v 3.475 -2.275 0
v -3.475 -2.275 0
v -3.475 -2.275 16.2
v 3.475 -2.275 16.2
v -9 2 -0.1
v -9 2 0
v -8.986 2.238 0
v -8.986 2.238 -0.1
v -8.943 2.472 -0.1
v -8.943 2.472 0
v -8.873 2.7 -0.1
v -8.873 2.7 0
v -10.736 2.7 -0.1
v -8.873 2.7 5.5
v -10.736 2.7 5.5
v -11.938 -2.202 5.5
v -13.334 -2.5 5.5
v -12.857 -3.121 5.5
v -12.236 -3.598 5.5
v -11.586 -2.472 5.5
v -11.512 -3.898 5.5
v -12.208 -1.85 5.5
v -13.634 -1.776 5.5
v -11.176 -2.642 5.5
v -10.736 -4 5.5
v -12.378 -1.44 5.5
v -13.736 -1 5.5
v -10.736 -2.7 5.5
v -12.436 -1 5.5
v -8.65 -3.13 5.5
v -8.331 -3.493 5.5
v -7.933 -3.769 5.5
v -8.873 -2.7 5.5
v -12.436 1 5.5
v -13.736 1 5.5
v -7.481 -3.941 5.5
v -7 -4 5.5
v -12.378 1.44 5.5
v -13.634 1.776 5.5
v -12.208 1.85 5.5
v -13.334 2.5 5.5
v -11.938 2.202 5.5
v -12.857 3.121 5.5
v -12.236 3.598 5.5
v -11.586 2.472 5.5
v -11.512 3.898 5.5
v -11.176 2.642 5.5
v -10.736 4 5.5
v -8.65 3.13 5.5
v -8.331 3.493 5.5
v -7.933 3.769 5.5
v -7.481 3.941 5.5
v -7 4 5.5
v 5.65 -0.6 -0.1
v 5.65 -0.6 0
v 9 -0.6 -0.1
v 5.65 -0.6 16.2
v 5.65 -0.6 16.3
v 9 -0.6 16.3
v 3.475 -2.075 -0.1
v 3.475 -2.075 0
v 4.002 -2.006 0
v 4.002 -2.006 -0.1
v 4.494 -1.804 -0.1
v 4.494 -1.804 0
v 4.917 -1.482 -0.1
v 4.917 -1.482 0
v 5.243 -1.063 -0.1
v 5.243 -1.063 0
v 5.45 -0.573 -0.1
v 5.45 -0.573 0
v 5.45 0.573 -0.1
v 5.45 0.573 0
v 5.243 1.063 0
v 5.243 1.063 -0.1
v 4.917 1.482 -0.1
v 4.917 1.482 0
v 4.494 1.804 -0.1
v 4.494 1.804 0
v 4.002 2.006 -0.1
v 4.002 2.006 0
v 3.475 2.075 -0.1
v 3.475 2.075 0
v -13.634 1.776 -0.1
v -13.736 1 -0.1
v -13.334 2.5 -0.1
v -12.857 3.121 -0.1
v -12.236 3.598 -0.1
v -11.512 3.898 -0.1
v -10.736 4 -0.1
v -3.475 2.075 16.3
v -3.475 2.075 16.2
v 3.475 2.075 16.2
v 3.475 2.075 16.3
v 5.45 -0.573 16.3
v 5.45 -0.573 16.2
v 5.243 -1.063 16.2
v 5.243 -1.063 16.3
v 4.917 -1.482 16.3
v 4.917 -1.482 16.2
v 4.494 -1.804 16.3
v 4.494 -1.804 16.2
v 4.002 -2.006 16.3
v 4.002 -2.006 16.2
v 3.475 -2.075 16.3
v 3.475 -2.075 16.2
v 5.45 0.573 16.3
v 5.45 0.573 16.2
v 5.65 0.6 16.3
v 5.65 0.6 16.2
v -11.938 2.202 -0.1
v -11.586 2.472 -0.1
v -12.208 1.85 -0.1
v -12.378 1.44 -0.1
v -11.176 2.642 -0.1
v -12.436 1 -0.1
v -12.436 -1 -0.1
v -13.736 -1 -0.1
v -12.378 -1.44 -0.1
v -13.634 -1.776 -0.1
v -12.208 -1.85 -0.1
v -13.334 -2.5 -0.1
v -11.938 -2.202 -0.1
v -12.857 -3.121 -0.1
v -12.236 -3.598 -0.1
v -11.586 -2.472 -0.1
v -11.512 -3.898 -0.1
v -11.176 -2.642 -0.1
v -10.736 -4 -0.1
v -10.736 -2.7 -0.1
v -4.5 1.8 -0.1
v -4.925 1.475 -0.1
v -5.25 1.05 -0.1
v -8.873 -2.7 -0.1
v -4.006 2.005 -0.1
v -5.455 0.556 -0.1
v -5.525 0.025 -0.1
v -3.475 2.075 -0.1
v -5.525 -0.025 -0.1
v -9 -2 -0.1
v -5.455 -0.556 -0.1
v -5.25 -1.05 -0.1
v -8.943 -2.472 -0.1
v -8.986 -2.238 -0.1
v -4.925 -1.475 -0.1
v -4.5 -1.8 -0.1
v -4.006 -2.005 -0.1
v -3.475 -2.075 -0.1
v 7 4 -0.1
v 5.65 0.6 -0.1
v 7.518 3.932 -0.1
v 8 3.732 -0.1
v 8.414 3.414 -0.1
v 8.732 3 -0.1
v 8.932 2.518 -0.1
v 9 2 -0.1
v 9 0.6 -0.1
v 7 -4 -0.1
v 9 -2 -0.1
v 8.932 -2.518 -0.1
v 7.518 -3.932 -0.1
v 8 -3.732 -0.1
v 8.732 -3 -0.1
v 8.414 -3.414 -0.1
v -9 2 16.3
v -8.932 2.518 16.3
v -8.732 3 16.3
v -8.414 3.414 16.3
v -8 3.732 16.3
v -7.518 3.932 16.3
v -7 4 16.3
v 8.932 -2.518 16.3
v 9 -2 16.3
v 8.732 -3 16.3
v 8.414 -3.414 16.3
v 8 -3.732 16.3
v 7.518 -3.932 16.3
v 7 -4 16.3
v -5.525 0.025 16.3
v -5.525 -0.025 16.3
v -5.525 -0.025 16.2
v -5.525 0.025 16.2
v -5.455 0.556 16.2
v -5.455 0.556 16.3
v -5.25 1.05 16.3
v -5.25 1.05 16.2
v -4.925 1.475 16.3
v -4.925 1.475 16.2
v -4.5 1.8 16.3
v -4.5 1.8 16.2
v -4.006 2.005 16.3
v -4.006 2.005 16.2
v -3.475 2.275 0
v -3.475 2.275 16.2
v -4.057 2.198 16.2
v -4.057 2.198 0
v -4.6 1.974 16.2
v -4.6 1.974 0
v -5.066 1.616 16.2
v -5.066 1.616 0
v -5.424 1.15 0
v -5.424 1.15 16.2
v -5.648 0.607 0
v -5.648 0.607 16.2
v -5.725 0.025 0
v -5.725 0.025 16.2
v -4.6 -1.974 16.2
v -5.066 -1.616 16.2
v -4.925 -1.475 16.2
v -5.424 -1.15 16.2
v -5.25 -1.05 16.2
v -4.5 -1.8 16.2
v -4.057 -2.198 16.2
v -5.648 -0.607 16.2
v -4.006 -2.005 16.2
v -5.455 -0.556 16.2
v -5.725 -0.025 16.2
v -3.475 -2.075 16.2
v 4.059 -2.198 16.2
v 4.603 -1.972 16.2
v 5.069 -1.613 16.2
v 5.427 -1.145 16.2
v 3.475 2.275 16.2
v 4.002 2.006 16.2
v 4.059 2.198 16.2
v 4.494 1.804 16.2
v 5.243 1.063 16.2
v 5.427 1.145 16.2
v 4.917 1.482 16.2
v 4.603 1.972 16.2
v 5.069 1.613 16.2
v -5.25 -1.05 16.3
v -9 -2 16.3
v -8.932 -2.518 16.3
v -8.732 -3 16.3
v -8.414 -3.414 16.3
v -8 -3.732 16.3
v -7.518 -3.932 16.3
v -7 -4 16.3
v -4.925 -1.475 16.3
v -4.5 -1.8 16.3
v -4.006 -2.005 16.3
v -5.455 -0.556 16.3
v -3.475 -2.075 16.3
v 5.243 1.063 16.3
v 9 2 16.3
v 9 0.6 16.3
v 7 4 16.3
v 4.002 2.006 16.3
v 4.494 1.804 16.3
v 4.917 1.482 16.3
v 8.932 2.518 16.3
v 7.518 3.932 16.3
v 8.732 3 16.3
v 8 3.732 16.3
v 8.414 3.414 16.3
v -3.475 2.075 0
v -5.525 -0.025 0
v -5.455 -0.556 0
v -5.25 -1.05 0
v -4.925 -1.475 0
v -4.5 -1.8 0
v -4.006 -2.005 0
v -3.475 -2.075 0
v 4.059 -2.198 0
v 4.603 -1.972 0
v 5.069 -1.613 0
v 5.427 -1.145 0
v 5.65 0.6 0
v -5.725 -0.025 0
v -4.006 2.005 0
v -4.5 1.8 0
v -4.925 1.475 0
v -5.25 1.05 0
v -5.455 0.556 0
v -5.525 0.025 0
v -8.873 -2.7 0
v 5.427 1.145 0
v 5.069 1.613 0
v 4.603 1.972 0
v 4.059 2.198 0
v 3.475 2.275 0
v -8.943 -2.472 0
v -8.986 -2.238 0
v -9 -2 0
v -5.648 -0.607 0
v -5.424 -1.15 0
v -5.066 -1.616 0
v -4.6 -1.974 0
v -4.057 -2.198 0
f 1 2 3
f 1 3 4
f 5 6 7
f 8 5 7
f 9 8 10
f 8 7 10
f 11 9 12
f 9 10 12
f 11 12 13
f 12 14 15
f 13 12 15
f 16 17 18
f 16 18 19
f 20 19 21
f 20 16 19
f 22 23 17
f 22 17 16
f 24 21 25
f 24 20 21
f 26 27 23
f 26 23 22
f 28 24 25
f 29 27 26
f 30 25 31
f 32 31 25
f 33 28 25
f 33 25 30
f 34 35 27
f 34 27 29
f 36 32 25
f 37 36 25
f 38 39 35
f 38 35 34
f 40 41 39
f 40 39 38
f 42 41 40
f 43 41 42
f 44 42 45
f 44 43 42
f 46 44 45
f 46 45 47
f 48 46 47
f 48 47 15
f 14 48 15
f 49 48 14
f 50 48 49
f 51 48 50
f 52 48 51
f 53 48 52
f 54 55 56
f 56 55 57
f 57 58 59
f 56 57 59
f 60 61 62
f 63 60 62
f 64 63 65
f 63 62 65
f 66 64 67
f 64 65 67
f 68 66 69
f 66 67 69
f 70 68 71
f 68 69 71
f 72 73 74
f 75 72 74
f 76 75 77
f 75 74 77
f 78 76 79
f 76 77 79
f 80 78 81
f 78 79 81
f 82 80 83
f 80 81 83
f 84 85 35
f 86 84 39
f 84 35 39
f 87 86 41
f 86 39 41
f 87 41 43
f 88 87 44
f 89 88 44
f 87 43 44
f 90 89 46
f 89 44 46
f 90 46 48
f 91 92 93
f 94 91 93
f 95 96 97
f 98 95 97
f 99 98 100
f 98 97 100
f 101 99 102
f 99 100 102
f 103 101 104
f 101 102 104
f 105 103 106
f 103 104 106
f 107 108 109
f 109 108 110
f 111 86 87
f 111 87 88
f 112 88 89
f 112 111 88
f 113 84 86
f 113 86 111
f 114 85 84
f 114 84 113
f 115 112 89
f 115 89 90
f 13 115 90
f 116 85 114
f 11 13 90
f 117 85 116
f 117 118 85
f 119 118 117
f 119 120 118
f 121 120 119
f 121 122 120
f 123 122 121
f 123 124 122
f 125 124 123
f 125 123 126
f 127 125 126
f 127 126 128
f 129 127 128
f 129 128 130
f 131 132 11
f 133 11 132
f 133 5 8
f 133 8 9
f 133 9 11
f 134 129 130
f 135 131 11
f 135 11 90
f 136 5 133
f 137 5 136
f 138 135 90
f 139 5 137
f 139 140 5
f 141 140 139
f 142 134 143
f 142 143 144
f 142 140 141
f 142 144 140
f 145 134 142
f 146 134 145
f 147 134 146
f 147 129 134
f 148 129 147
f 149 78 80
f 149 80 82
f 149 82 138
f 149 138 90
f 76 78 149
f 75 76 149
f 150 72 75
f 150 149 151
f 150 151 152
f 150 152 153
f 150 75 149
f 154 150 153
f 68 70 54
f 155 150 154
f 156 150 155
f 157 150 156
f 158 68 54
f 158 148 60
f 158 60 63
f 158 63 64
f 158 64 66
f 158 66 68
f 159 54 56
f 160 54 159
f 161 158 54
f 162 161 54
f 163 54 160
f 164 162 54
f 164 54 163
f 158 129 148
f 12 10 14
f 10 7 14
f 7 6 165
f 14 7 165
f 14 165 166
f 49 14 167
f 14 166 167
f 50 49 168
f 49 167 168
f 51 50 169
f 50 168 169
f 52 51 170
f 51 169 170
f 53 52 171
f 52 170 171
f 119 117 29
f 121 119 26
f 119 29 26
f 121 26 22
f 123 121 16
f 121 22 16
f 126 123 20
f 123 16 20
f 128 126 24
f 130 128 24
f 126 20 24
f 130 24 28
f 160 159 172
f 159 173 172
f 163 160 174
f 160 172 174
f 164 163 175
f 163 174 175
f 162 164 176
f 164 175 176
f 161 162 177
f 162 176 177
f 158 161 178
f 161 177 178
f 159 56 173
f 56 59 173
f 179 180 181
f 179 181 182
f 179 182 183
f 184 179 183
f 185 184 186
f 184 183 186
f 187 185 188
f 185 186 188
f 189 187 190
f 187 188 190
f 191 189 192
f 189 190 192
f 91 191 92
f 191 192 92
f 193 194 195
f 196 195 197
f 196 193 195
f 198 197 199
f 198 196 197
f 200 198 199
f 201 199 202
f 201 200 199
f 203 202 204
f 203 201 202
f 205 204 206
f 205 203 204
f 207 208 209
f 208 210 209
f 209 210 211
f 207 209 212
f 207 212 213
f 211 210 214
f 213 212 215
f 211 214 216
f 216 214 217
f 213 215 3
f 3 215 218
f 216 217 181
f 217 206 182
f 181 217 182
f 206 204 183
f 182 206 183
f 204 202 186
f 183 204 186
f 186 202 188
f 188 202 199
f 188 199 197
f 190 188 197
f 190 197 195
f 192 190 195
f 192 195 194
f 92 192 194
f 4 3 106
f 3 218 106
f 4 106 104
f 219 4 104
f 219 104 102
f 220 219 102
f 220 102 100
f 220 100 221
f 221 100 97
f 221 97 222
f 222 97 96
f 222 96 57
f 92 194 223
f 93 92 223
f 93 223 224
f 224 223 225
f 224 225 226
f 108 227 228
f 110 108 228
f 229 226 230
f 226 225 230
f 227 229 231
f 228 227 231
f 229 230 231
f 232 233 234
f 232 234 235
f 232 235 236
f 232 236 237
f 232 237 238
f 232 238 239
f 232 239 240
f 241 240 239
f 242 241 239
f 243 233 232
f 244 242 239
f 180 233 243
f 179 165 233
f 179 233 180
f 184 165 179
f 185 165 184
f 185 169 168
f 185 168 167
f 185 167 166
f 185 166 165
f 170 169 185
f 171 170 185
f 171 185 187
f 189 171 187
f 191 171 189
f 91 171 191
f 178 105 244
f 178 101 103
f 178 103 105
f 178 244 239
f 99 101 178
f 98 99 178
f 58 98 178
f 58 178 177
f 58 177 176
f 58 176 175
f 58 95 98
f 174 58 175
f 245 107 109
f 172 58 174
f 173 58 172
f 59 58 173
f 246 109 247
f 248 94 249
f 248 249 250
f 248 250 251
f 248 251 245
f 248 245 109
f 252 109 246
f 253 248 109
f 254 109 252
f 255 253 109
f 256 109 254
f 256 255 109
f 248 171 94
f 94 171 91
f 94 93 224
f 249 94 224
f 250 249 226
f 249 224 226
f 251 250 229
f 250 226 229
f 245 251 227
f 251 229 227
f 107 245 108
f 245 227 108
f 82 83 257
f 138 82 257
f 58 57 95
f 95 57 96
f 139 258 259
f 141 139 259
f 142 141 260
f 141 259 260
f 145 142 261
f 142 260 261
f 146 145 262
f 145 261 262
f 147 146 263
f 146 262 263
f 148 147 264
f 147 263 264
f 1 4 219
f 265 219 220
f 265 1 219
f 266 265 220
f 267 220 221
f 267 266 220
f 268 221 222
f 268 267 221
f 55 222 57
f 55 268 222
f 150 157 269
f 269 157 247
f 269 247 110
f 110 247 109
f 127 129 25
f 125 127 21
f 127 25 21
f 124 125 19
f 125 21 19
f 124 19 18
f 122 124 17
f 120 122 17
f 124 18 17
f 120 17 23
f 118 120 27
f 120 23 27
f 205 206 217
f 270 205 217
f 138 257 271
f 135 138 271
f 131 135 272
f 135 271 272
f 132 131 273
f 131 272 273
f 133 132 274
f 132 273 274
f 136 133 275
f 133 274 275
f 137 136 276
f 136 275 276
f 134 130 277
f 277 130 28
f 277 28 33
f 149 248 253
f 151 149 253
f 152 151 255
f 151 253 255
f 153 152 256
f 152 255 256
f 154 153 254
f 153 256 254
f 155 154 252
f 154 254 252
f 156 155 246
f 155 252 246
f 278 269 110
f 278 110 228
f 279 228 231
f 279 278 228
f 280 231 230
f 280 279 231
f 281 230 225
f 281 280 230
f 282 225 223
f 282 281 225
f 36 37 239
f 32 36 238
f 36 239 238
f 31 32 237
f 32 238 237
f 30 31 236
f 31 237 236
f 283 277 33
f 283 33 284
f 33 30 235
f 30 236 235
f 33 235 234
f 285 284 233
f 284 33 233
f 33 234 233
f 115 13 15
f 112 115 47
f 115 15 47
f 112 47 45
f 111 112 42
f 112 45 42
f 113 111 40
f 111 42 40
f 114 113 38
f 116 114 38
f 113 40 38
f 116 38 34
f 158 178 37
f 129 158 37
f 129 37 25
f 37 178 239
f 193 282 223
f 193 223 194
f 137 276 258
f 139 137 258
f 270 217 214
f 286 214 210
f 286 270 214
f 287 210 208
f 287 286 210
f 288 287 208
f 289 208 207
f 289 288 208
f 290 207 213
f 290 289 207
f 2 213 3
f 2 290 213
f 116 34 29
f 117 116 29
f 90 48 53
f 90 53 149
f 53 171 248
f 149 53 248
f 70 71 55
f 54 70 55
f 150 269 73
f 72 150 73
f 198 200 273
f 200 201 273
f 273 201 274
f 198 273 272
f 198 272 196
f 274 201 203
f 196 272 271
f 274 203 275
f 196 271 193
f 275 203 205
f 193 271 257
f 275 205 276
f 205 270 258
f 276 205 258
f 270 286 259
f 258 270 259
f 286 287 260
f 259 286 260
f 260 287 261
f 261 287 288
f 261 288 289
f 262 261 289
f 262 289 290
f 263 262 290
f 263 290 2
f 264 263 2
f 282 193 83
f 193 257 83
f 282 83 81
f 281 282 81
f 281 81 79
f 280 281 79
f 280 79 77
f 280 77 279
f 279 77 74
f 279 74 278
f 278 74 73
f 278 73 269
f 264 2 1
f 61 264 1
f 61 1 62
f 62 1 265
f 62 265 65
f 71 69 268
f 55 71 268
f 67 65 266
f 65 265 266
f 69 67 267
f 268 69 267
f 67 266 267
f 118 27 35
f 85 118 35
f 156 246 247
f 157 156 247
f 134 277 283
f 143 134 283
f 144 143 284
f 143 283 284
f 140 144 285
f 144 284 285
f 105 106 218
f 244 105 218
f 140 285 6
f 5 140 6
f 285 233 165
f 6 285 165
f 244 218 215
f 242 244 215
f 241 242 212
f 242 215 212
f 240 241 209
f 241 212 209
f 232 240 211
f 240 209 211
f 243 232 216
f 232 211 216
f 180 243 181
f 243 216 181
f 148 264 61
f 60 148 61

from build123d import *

# Parameters (mm, degrees)
F0_W      = 8
F0_H      = 2.5
F1_DEPTH  = 16.25
F3_DEPTH  = 16.2
F5_W      = 1.2
F5_H      = 18
F7_DEPTH  = 3.3507126627
F8_DEPTH  = 5.5
F10_DEPTH = 0.1
F12_DEPTH = 0.1


with BuildPart() as f1:
    # F0 (on Top) → F1 (new body)
    with BuildSketch(Plane.XY):
        with BuildLine():
            Line((-3.475, -2.275), (3.475, -2.275))
            ThreePointArc((3.475, -2.275), (5.0659902577, -1.6159902577), (5.725, -0.025))
            Line((5.725, -0.025), (5.725, 0.025))
            ThreePointArc((5.725, 0.025), (5.0659902577, 1.6159902577), (3.475, 2.275))
            Line((3.475, 2.275), (-3.475, 2.275))
            ThreePointArc((-3.475, 2.275), (-5.0659902577, 1.6159902577), (-5.725, 0.025))
            Line((-5.725, 0.025), (-5.725, -0.025))
            ThreePointArc((-5.725, -0.025), (-5.0659902577, -1.6159902577), (-3.475, -2.275))
        make_face()
        Rectangle(F0_W, F0_H, mode=Mode.SUBTRACT)
        Rectangle(F0_W, F0_H)
    extrude(amount=F1_DEPTH)


with BuildPart() as f3:
    # F2 (on Top) → F3 (new body)
    with BuildSketch(Plane.XY):
        with BuildLine():
            Line((-7, -4), (7, -4))
            ThreePointArc((7, -4), (8.4142135624, -3.4142135624), (9, -2))
            Line((9, -2), (9, 2))
            ThreePointArc((9, 2), (8.4142135624, 3.4142135624), (7, 4))
            Line((7, 4), (-7, 4))
            Line((-7, 4), (-7, -4))
        make_face()
        with BuildLine():
            ThreePointArc((-9, -2), (-8.9681207868, -2.3556691844), (-8.8734994313, -2.6999999151))
            Line((-8.8734994313, -2.6999999151), (-7.9164700583, -2.6999999151))
            Line((-7.9164700583, -2.6999999151), (-7.9164700583, 2.6999999151))
            Line((-7.9164700583, 2.6999999151), (-8.8734994313, 2.6999999151))
            ThreePointArc((-8.8734994313, 2.6999999151), (-8.9681207868, 2.3556691844), (-9, 2))
            Line((-9, 2), (-9, -2))
        make_face()
        with BuildLine():
            ThreePointArc((-8.8734994313, -2.6999999151), (-8.1401754623, -3.6431676467), (-7, -4))
            Line((-7, -4), (-7, 4))
            ThreePointArc((-7, 4), (-8.1401754623, 3.6431676467), (-8.8734994313, 2.6999999151))
            Line((-8.8734994313, 2.6999999151), (-7.9164700583, 2.6999999151))
            Line((-7.9164700583, 2.6999999151), (-7.9164700583, -2.6999999151))
            Line((-7.9164700583, -2.6999999151), (-8.8734994313, -2.6999999151))
        make_face()
    extrude(amount=F3_DEPTH)

    # F6: cut F1
    add(f1.part, mode=Mode.SUBTRACT)

    # F5 (on face) → F7 (cut, through all)
    with BuildSketch(Plane.YZ.offset(9)):
        with Locations((0, 8)):
            Rectangle(F5_W, F5_H)
    extrude(amount=-F7_DEPTH, mode=Mode.SUBTRACT)

    # F2 (on Top) → F8 (join)
    with BuildSketch(Plane.XY):
        with BuildLine():
            Line((-10.7359819859, -4), (-7, -4))
            ThreePointArc((-7, -4), (-8.1401754623, -3.6431676467), (-8.8734994313, -2.6999999151))
            Line((-8.8734994313, -2.6999999151), (-10.7359819859, -2.6999999151))
            ThreePointArc((-10.7359819859, -2.6999999151), (-11.9380634539, -2.202081468), (-12.435981901, -1))
            Line((-12.435981901, -1), (-12.435981901, 1))
            ThreePointArc((-12.435981901, 1), (-11.9380634539, 2.202081468), (-10.7359819859, 2.6999999151))
            Line((-10.7359819859, 2.6999999151), (-8.8734994313, 2.6999999151))
            ThreePointArc((-8.8734994313, 2.6999999151), (-8.1401754623, 3.6431676467), (-7, 4))
            Line((-7, 4), (-10.7359819859, 4))
            ThreePointArc((-10.7359819859, 4), (-12.8573023295, 3.1213203436), (-13.7359819859, 1))
            Line((-13.7359819859, 1), (-13.7359819859, -1))
            ThreePointArc((-13.7359819859, -1), (-12.8573023295, -3.1213203436), (-10.7359819859, -4))
        make_face()
    extrude(amount=F8_DEPTH)

    # F9 (on face) → F10 (join)
    with BuildSketch(Plane.XY.offset(16.2)):
        with BuildLine():
            Line((3.475, -2.0750000357), (-3.475, -2.0750000357))
            ThreePointArc((-3.475, -2.0750000357), (-4.9245689267, -1.4745689267), (-5.5250000357, -0.025))
            Line((-5.5250000357, -0.025), (-5.5250000357, 0.025))
            ThreePointArc((-5.5250000357, 0.025), (-4.9245689267, 1.4745689267), (-3.475, 2.0750000357))
            Line((-3.475, 2.0750000357), (3.475, 2.0750000357))
            ThreePointArc((3.475, 2.0750000357), (4.7156218246, 1.6569796674), (5.4502873731, 0.5733976115))
            Line((5.4502873731, 0.5733976115), (5.6502873373, 0.6))
            ThreePointArc((5.6502873373, 0.6), (4.8477253913, 1.8077296486), (3.475, 2.275))
            Line((3.475, 2.275), (-3.475, 2.275))
            ThreePointArc((-3.475, 2.275), (-5.0659902577, 1.6159902577), (-5.725, 0.025))
            Line((-5.725, 0.025), (-5.725, -0.025))
            ThreePointArc((-5.725, -0.025), (-5.0659902577, -1.6159902577), (-3.475, -2.275))
            Line((-3.475, -2.275), (3.475, -2.275))
            ThreePointArc((3.475, -2.275), (4.8477253913, -1.8077296486), (5.6502873373, -0.6))
            Line((5.6502873373, -0.6), (5.4502873731, -0.5733976115))
            ThreePointArc((5.4502873731, -0.5733976115), (4.7156218246, -1.6569796674), (3.475, -2.0750000357))
        make_face()
        with BuildLine():
            Line((9, -0.6), (5.6502873373, -0.6))
            ThreePointArc((5.6502873373, -0.6), (4.8477253913, -1.8077296486), (3.475, -2.275))
            Line((3.475, -2.275), (-3.475, -2.275))
            ThreePointArc((-3.475, -2.275), (-5.0659902577, -1.6159902577), (-5.725, -0.025))
            Line((-5.725, -0.025), (-5.725, 0.025))
            ThreePointArc((-5.725, 0.025), (-5.0659902577, 1.6159902577), (-3.475, 2.275))
            Line((-3.475, 2.275), (3.475, 2.275))
            ThreePointArc((3.475, 2.275), (4.8477253913, 1.8077296486), (5.6502873373, 0.6))
            Line((5.6502873373, 0.6), (9, 0.6))
            Line((9, 0.6), (9, 2))
            ThreePointArc((9, 2), (8.4142135624, 3.4142135624), (7, 4))
            Line((7, 4), (-7, 4))
            ThreePointArc((-7, 4), (-8.4142135624, 3.4142135624), (-9, 2))
            Line((-9, 2), (-9, -2))
            ThreePointArc((-9, -2), (-8.4142135624, -3.4142135624), (-7, -4))
            Line((-7, -4), (7, -4))
            ThreePointArc((7, -4), (8.4142135624, -3.4142135624), (9, -2))
            Line((9, -2), (9, -0.6))
        make_face()
    extrude(amount=F10_DEPTH)

    # F11 (on face) → F12 (join)
    with BuildSketch(Plane(origin=(0, 0, 0), x_dir=(1, 0, 0), z_dir=(0, 0, -1))):
        with BuildLine():
            ThreePointArc((5.4502873731, -0.5733976115), (4.7156218246, -1.6569796674), (3.475, -2.0750000357))
            Line((3.475, -2.0750000357), (-3.475, -2.0750000357))
            ThreePointArc((-3.475, -2.0750000357), (-4.9245689267, -1.4745689267), (-5.5250000357, -0.025))
            Line((-5.5250000357, -0.025), (-5.5250000357, 0.025))
            ThreePointArc((-5.5250000357, 0.025), (-4.9245689267, 1.4745689267), (-3.475, 2.0750000357))
            Line((-3.475, 2.0750000357), (3.475, 2.0750000357))
            ThreePointArc((3.475, 2.0750000357), (4.7156218246, 1.6569796674), (5.4502873731, 0.5733976115))
            Line((5.4502873731, 0.5733976115), (5.6502873373, 0.6))
            ThreePointArc((5.6502873373, 0.6), (4.8477253913, 1.8077296486), (3.475, 2.275))
            Line((3.475, 2.275), (-3.475, 2.275))
            ThreePointArc((-3.475, 2.275), (-5.0659902577, 1.6159902577), (-5.725, 0.025))
            Line((-5.725, 0.025), (-5.725, -0.025))
            ThreePointArc((-5.725, -0.025), (-5.0659902577, -1.6159902577), (-3.475, -2.275))
            Line((-3.475, -2.275), (3.475, -2.275))
            ThreePointArc((3.475, -2.275), (4.8477253913, -1.8077296486), (5.6502873373, -0.6))
            Line((5.6502873373, -0.6), (5.4502873731, -0.5733976115))
        make_face()
        with BuildLine():
            Line((9, -0.6), (5.6502873373, -0.6))
            ThreePointArc((5.6502873373, -0.6), (4.8477253913, -1.8077296486), (3.475, -2.275))
            Line((3.475, -2.275), (-3.475, -2.275))
            ThreePointArc((-3.475, -2.275), (-5.0659902577, -1.6159902577), (-5.725, -0.025))
            Line((-5.725, -0.025), (-5.725, 0.025))
            ThreePointArc((-5.725, 0.025), (-5.0659902577, 1.6159902577), (-3.475, 2.275))
            Line((-3.475, 2.275), (3.475, 2.275))
            ThreePointArc((3.475, 2.275), (4.8477253913, 1.8077296486), (5.6502873373, 0.6))
            Line((5.6502873373, 0.6), (9, 0.6))
            Line((9, 0.6), (9, 2))
            ThreePointArc((9, 2), (8.4142135624, 3.4142135624), (7, 4))
            Line((7, 4), (-7, 4))
            Line((-7, 4), (-10.7359819859, 4))
            ThreePointArc((-10.7359819859, 4), (-12.8573023295, 3.1213203436), (-13.7359819859, 1))
            Line((-13.7359819859, 1), (-13.7359819859, -1))
            ThreePointArc((-13.7359819859, -1), (-12.8573023295, -3.1213203436), (-10.7359819859, -4))
            Line((-10.7359819859, -4), (-7, -4))
            Line((-7, -4), (7, -4))
            ThreePointArc((7, -4), (8.4142135624, -3.4142135624), (9, -2))
            Line((9, -2), (9, -0.6))
        make_face()
        with BuildLine():
            Line((-10.7359819859, 2.6999999151), (-8.8734994313, 2.6999999151))
            ThreePointArc((-8.8734994313, 2.6999999151), (-8.9681207868, 2.3556691844), (-9, 2))
            Line((-9, 2), (-9, -2))
            ThreePointArc((-9, -2), (-8.9681207868, -2.3556691844), (-8.8734994313, -2.6999999151))
            Line((-8.8734994313, -2.6999999151), (-10.7359819859, -2.6999999151))
            ThreePointArc((-10.7359819859, -2.6999999151), (-11.9380634539, -2.202081468), (-12.435981901, -1))
            Line((-12.435981901, -1), (-12.435981901, 1))
            ThreePointArc((-12.435981901, 1), (-11.9380634539, 2.202081468), (-10.7359819859, 2.6999999151))
        make_face(mode=Mode.SUBTRACT)
    extrude(amount=F12_DEPTH)


solid = f3.part
